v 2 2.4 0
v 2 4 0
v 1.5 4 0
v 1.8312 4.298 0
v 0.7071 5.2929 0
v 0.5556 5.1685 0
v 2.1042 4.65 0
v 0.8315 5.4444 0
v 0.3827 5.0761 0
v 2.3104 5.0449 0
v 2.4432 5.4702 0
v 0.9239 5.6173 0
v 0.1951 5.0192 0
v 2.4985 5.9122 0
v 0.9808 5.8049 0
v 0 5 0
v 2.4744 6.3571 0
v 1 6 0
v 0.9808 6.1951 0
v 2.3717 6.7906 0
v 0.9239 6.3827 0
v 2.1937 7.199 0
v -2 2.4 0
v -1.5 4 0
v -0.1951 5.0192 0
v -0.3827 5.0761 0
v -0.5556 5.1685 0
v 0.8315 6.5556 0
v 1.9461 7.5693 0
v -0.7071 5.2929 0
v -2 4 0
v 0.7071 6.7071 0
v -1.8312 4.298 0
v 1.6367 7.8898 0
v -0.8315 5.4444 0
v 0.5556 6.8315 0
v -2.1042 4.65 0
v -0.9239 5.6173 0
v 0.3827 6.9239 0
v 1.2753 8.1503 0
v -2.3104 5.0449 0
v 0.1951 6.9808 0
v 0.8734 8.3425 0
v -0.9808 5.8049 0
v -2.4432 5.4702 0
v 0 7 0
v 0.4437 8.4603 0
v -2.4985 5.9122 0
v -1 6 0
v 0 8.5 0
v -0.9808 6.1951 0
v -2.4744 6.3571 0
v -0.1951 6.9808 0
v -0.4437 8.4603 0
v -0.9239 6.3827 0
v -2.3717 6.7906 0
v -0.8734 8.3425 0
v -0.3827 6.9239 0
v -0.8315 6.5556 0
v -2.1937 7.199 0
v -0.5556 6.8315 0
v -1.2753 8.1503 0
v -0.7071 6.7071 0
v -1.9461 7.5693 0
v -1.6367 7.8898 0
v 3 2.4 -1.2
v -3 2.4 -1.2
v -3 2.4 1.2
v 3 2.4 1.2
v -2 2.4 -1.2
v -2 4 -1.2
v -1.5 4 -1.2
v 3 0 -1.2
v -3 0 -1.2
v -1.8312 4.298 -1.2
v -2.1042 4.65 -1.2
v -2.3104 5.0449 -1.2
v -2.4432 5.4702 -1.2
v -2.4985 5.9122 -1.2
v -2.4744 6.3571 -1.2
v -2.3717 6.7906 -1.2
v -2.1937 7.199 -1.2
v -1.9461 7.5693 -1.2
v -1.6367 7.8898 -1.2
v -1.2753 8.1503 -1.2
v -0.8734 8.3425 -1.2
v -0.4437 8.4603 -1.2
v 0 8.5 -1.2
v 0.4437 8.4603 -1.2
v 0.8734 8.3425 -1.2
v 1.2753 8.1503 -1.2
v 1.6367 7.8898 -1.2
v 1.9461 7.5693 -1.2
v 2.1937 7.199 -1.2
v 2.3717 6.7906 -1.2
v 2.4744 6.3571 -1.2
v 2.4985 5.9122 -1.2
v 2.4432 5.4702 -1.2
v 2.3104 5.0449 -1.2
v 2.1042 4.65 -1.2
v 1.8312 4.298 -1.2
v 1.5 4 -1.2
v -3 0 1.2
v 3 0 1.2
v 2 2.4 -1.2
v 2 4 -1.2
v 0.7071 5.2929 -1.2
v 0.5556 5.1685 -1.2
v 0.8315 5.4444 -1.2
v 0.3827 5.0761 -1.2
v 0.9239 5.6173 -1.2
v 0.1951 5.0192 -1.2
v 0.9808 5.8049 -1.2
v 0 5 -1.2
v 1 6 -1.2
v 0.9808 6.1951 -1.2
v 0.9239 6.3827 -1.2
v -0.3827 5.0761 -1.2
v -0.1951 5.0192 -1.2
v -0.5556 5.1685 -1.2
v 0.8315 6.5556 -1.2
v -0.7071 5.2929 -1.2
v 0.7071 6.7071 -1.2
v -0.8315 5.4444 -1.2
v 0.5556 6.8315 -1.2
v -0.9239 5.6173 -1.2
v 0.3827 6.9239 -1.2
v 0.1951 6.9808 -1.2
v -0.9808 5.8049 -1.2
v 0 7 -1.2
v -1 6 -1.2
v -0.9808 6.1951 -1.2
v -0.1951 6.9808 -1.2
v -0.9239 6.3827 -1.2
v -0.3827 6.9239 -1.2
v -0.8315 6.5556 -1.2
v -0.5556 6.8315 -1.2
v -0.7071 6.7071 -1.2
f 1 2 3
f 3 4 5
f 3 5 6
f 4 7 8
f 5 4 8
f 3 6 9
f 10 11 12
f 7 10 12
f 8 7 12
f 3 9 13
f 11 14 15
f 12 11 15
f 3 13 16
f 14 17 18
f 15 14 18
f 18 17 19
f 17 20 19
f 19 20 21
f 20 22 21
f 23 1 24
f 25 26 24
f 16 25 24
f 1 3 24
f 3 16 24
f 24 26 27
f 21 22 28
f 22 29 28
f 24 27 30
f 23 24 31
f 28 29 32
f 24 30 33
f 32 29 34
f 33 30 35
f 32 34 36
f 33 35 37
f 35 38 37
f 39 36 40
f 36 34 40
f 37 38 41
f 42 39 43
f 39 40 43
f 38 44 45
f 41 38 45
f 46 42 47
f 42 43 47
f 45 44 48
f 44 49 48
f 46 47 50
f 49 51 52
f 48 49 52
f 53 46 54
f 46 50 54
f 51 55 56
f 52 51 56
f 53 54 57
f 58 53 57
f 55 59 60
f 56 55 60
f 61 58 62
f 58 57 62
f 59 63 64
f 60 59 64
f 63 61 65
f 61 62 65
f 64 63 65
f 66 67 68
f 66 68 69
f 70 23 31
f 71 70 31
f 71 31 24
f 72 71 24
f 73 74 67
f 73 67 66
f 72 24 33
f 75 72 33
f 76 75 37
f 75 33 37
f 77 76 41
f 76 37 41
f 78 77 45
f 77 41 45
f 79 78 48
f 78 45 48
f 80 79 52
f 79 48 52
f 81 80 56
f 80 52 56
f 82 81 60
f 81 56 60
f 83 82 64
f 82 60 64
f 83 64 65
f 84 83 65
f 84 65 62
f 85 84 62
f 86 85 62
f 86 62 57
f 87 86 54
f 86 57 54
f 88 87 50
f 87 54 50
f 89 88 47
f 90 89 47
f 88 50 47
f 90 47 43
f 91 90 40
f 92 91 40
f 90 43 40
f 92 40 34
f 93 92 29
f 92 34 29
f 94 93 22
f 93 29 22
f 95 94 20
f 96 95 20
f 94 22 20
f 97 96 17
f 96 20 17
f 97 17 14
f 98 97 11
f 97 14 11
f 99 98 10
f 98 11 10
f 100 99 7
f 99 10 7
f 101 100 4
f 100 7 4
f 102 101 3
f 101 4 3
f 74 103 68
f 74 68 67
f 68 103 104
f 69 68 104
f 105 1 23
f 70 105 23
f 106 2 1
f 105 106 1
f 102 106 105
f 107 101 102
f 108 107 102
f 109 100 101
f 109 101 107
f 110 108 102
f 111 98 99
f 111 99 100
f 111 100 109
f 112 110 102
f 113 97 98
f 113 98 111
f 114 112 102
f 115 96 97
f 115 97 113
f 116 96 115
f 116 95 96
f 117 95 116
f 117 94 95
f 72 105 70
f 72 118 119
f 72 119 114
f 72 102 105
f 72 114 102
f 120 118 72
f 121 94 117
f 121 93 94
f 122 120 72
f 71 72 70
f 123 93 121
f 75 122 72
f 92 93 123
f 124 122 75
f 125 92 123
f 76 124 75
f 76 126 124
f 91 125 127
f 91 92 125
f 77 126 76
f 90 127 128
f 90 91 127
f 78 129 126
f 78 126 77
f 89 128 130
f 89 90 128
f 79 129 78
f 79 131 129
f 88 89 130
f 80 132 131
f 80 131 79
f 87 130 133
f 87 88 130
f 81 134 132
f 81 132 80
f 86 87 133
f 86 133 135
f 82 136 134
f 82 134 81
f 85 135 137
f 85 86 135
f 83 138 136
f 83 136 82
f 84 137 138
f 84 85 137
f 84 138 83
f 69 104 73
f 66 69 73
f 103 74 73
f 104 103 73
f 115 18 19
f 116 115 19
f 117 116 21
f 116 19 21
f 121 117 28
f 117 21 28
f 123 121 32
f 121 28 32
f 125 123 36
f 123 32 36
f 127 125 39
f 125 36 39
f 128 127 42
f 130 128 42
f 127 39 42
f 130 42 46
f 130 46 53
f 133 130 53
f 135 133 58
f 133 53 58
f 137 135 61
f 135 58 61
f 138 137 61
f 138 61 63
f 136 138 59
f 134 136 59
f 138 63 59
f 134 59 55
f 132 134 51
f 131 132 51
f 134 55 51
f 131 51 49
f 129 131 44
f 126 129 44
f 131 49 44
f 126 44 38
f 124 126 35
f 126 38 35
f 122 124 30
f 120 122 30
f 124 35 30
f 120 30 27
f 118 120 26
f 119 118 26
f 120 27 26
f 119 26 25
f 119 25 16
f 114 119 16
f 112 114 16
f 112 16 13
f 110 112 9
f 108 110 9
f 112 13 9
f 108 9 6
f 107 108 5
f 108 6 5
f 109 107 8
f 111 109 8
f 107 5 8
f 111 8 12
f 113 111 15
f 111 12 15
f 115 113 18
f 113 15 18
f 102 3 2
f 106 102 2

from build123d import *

# Parameters (mm, degrees)
SKETCH_1_W          = 6
SKETCH_1_H          = 2.4
EXTRUDE_1_DEPTH     = 2.4
EXTRUDE_3_DEPTH     = 1.2
SKETCH_4_R          = 1
CUT_EXTRUDE_4_DEPTH = 1.2


with BuildPart() as part:
    # 草圖1 → 伸長1 (new body)
    with BuildSketch(Plane(origin=(0, 0, 0), x_dir=(1, 0, 0), z_dir=(0, 1, 0))):
        Rectangle(SKETCH_1_W, SKETCH_1_H)
    extrude(amount=EXTRUDE_1_DEPTH)


with BuildPart() as body_2:
    # 草圖2 → 伸長3 (new body)
    with BuildSketch(Plane.XY):
        with BuildLine():
            Line((-2, 4), (-1.5, 4))
            ThreePointArc((-1.5, 4), (0, 8.5), (1.5, 4))
            Line((1.5, 4), (2, 4))
            Line((2, 4), (2, 2.4))
            Line((2, 2.4), (-2, 2.4))
            Line((-2, 2.4), (-2, 4))
        make_face()
    extrude(amount=-EXTRUDE_3_DEPTH)

    # 草圖4 → 伸長4 (cut)
    with BuildSketch(Plane.XY):
        with Locations((0, 6)):
            Circle(SKETCH_4_R)
    extrude(amount=-CUT_EXTRUDE_4_DEPTH, mode=Mode.SUBTRACT)


solid = Compound([part.part, body_2.part])
